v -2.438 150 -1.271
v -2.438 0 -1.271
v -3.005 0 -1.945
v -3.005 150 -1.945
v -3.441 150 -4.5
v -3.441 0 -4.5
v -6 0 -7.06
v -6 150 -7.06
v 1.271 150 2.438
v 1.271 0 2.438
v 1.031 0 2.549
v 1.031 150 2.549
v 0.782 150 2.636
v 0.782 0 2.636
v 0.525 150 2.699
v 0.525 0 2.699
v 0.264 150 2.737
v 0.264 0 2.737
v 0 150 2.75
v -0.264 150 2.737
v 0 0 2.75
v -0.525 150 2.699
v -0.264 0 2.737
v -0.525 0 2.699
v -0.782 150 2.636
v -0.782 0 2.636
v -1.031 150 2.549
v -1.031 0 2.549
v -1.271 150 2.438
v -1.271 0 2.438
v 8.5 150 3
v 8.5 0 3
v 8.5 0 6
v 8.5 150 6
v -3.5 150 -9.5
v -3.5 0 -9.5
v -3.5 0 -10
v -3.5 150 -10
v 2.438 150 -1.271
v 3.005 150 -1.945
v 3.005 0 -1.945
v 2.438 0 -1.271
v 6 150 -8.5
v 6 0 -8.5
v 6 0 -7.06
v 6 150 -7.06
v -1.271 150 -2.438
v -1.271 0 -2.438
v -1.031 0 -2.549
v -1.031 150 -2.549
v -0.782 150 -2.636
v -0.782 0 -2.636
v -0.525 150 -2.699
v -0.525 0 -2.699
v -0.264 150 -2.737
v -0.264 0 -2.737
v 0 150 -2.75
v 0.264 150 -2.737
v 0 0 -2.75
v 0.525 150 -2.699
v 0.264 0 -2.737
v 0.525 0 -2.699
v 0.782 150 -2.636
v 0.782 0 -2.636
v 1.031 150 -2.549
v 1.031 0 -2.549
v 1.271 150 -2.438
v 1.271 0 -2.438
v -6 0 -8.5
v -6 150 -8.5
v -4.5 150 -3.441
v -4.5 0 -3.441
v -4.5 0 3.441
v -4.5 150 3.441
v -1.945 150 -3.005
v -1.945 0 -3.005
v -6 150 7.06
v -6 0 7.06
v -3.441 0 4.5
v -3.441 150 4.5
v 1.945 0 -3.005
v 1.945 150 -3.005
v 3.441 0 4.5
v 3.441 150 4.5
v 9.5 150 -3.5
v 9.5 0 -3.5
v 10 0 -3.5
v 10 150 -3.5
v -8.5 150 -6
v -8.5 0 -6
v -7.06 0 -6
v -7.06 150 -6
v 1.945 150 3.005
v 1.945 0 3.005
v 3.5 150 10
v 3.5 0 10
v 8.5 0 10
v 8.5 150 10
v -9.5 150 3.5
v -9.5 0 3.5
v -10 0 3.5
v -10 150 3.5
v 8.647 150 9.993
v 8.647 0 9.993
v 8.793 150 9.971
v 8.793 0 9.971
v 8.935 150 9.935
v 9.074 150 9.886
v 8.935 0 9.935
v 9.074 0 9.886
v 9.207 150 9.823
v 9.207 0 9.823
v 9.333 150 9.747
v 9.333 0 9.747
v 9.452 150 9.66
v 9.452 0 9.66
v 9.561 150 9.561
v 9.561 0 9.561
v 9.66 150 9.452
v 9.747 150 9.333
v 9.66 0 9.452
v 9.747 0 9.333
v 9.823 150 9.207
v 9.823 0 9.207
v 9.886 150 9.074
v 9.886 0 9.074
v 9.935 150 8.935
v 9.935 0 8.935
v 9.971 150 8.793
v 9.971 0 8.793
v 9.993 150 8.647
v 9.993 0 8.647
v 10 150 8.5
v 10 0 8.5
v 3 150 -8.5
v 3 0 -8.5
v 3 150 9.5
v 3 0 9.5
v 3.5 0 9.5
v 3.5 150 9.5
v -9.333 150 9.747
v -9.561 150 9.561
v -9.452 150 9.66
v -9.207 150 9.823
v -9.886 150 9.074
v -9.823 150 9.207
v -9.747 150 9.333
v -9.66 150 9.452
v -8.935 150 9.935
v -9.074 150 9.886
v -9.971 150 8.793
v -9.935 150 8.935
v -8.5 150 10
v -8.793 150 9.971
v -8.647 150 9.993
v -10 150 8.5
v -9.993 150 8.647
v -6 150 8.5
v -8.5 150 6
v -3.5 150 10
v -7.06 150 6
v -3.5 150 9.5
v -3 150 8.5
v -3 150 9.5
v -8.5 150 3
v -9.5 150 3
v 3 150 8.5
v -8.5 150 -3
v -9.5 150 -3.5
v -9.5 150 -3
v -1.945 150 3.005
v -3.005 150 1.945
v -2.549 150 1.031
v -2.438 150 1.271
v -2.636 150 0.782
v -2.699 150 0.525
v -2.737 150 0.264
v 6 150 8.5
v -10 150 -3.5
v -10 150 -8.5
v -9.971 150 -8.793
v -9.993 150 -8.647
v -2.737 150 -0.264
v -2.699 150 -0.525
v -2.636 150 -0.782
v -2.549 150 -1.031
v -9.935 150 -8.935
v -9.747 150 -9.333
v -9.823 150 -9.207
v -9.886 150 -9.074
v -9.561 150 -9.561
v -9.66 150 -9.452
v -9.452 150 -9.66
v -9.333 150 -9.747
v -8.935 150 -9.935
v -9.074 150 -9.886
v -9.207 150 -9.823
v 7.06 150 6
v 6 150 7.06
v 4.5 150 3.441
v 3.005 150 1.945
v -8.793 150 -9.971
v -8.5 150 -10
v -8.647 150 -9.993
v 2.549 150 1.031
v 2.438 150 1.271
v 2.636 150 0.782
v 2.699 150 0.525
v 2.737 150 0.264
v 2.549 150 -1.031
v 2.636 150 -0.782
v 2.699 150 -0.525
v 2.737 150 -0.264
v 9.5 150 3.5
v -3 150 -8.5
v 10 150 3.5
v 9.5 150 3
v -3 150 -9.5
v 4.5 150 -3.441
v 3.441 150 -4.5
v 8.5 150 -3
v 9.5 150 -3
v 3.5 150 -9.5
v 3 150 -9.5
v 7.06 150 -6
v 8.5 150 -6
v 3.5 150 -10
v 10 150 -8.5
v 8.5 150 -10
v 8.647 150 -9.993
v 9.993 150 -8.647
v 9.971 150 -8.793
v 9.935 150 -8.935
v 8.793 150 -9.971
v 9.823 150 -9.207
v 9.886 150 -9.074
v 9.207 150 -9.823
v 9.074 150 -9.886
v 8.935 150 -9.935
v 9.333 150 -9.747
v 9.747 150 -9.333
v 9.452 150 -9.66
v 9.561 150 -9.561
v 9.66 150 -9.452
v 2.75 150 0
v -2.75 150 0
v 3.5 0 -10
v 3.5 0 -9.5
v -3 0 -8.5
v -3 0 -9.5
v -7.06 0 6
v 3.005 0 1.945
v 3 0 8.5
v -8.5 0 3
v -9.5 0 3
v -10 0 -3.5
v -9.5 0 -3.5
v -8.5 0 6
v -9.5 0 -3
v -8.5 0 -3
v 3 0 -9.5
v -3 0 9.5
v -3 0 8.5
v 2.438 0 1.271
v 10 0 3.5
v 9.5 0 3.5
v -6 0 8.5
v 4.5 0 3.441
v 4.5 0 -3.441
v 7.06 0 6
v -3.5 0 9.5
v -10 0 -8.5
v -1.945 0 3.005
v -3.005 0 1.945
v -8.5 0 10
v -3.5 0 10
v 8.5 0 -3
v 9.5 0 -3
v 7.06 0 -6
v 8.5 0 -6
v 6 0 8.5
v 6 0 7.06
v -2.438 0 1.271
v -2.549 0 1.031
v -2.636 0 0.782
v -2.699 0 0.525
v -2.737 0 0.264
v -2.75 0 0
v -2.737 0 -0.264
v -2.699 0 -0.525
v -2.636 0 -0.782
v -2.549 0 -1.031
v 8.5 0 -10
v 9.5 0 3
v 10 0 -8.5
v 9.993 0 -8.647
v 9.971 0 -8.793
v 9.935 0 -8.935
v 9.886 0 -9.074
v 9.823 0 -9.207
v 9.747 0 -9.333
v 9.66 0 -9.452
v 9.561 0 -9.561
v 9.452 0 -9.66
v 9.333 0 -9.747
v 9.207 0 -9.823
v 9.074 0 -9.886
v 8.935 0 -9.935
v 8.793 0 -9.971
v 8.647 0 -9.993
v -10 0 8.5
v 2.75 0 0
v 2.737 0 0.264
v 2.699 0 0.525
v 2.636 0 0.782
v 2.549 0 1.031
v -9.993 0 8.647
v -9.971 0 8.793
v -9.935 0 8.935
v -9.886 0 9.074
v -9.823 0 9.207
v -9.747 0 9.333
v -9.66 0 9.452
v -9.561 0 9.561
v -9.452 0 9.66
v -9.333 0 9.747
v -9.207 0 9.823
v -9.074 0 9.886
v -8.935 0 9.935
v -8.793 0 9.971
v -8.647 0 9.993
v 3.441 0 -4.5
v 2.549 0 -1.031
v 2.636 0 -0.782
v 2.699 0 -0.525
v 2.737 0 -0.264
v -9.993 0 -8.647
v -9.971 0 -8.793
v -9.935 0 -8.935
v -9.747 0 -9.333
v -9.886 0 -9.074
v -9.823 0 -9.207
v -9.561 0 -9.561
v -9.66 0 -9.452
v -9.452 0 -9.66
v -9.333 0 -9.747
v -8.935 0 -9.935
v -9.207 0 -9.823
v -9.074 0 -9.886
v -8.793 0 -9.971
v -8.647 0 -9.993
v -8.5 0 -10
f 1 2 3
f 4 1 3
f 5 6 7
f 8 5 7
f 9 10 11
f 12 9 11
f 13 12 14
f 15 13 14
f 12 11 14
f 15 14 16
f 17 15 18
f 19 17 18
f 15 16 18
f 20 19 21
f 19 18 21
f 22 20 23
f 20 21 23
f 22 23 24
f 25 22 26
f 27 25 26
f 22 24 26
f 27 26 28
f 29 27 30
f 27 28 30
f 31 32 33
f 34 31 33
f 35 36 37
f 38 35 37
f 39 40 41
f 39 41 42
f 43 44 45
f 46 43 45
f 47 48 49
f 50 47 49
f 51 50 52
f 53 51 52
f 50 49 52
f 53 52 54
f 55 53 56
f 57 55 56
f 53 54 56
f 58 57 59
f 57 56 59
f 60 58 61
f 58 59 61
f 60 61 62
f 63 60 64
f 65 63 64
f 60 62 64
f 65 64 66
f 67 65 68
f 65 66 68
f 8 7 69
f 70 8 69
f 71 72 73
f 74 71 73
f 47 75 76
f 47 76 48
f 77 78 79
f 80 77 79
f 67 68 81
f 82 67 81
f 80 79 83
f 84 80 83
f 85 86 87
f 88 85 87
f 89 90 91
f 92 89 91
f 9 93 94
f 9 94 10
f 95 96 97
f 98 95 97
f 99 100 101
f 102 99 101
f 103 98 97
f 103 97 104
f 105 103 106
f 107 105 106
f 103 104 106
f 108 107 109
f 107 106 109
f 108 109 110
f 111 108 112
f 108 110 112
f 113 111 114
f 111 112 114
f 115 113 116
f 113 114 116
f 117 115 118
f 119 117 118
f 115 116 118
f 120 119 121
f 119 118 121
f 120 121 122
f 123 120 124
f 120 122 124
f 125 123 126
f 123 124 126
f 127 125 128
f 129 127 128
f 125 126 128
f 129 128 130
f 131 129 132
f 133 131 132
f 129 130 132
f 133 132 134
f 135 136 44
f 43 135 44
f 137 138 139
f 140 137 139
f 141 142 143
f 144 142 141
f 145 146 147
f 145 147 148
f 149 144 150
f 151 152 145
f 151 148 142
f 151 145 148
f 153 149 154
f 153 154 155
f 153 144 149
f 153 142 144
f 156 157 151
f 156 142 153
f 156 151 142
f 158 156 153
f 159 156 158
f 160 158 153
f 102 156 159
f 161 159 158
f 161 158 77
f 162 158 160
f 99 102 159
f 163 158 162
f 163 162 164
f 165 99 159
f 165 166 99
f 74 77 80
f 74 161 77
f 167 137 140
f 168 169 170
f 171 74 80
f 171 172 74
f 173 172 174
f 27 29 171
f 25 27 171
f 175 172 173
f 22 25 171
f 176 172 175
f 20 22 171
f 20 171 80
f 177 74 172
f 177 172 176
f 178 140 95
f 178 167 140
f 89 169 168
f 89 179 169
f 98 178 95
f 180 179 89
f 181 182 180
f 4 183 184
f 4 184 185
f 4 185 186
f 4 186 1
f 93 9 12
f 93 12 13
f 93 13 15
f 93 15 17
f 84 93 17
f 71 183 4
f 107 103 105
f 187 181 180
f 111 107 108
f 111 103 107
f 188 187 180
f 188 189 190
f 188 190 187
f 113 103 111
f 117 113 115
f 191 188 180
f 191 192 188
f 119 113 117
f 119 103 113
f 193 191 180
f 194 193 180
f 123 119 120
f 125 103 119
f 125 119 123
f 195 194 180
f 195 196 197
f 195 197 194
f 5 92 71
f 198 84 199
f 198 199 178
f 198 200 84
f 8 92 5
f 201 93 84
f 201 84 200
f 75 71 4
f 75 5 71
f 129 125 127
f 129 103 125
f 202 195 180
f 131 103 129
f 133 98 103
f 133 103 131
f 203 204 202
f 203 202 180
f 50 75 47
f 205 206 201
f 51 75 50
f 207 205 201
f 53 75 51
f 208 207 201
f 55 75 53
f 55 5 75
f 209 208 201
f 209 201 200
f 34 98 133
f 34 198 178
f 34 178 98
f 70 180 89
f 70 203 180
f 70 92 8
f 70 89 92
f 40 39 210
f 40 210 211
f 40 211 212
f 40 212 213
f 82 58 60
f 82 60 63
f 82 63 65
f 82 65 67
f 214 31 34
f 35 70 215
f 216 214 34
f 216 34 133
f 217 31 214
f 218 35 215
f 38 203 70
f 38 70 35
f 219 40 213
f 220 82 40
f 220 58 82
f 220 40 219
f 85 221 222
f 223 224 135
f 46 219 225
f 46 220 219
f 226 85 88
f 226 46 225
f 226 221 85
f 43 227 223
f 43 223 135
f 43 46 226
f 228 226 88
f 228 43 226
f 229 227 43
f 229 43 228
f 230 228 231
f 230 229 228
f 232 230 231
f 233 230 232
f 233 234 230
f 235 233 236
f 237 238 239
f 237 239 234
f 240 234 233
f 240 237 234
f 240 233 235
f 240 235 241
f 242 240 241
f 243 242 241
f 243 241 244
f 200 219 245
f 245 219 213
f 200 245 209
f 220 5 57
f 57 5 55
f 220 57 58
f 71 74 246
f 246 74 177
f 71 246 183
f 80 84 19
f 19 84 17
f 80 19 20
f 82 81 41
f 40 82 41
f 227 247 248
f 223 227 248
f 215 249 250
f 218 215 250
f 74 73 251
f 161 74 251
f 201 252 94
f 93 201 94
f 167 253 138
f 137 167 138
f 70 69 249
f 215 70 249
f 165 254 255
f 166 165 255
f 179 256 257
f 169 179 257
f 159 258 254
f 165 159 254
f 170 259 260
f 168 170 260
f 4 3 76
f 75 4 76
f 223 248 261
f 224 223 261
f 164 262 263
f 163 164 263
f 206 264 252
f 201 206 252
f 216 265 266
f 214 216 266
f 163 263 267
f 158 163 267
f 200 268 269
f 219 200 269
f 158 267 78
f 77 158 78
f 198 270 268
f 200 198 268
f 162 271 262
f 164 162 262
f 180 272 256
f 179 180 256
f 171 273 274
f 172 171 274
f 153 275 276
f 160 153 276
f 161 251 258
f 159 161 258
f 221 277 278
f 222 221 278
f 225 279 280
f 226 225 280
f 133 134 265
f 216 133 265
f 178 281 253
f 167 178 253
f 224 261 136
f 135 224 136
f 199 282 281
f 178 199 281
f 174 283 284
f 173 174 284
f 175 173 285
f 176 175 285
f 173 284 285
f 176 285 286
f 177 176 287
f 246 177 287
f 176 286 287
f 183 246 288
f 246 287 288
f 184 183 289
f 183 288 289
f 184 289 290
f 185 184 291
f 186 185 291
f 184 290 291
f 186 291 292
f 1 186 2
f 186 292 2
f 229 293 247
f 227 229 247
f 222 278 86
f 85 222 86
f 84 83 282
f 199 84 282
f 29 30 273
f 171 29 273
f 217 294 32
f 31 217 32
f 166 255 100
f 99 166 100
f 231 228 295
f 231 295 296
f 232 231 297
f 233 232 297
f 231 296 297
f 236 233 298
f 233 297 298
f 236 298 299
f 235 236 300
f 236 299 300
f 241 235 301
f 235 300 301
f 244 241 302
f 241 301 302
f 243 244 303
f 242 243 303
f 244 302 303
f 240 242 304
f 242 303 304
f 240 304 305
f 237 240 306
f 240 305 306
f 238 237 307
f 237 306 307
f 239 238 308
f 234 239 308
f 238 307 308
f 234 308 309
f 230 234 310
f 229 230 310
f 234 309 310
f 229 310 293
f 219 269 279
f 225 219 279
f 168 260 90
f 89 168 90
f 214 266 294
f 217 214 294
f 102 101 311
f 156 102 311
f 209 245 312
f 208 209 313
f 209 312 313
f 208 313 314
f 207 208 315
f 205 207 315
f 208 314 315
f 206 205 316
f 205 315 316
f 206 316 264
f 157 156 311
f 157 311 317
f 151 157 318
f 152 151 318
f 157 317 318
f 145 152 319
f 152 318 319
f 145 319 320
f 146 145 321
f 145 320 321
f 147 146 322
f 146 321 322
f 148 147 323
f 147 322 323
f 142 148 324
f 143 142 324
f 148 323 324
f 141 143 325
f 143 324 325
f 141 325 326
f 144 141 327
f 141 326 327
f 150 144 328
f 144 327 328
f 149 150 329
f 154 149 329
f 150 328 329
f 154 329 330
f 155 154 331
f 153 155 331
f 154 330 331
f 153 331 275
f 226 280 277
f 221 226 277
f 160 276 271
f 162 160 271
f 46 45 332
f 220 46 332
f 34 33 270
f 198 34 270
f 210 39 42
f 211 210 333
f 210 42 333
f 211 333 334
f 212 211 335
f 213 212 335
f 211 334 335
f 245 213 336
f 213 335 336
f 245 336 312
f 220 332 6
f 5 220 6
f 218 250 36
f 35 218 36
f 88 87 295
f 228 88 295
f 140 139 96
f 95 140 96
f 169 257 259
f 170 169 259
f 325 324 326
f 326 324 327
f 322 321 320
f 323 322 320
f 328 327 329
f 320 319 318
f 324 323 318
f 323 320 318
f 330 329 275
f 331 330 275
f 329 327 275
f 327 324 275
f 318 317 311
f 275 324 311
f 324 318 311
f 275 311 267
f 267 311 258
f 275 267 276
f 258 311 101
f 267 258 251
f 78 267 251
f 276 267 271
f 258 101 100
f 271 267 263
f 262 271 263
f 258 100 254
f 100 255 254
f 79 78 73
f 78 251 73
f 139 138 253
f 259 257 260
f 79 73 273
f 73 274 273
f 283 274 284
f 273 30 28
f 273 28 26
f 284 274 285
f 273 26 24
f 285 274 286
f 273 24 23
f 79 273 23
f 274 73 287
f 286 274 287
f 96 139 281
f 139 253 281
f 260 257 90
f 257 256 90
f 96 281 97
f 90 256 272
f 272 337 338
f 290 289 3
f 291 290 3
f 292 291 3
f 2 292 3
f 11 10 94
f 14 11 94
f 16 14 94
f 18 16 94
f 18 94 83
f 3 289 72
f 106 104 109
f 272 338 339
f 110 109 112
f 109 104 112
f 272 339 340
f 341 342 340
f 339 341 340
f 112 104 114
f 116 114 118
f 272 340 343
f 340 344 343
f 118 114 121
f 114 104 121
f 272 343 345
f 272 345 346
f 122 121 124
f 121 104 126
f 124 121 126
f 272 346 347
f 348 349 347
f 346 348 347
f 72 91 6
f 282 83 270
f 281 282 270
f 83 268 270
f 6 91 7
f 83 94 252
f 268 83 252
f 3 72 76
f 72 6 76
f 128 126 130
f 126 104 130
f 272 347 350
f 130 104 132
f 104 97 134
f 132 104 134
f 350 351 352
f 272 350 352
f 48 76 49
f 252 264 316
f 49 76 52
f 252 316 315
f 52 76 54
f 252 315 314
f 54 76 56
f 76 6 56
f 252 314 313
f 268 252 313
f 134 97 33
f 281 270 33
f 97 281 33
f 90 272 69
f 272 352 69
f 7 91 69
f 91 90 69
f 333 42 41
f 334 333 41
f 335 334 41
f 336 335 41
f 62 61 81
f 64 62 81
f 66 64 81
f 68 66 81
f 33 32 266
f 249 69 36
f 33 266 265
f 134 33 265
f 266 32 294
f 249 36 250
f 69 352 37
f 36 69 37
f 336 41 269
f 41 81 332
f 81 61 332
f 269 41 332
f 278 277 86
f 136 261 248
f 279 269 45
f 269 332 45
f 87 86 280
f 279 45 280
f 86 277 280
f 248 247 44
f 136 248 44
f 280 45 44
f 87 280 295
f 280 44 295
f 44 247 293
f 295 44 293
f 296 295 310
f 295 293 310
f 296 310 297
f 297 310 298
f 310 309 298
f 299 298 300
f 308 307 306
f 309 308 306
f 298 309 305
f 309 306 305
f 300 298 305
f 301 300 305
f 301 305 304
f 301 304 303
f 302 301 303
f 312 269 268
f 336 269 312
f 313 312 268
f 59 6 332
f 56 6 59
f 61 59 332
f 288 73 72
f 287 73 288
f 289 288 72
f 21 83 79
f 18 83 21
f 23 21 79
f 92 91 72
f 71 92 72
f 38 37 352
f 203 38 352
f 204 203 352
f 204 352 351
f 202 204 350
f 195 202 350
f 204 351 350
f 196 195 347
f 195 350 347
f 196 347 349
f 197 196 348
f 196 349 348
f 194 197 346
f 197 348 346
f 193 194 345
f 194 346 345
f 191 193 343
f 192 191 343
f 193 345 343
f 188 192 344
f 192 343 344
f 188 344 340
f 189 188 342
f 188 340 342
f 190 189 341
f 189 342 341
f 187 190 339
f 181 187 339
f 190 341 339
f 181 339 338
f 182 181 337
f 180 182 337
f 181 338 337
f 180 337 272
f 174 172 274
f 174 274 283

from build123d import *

# Parameters (mm, degrees)
DODANIE_WYCI_GNI_CIE1_DEPTH = 150


with BuildPart() as part:
    # Szkic1 → Dodanie-wyciągnięcie1 (new body)
    # profile 1 of 5: a face of its own
    with BuildSketch(Plane(origin=(0, 0, 0), x_dir=(1, 0, 0), z_dir=(0, 1, 0))):
        with BuildLine():
            Line((-7.06, 6), (-4.5, 3.440546933))
            Line((-4.5, 3.440546933), (-4.5, 4.5))
            Line((-4.5, 4.5), (-3.440546933, 4.5))
            Line((-3.440546933, 4.5), (-6, 7.06))
            Line((-6, 7.06), (-6, 8.5))
            Line((-6, 8.5), (-3, 8.5))
            Line((-3, 8.5), (-3, 9.5))
            Line((-3, 9.5), (-3.5, 9.5))
            Line((-3.5, 9.5), (-3.5, 10))
            Line((-3.5, 10), (-8.5, 10))
            ThreePointArc((-8.5, 10), (-9.560660172, 9.560660172), (-10, 8.5))
            Line((-10, 8.5), (-10, 3.5))
            Line((-10, 3.5), (-9.5, 3.5))
            Line((-9.5, 3.5), (-9.5, 3))
            Line((-9.5, 3), (-8.5, 3))
            Line((-8.5, 3), (-8.5, 6))
            Line((-8.5, 6), (-7.06, 6))
        make_face()
    # profile 2 of 5: a face of its own
    with BuildSketch(Plane(origin=(0, 0, 0), x_dir=(1, 0, 0), z_dir=(0, 1, 0))):
        with BuildLine():
            Line((4.5, 4.5), (4.5, 3.440546933))
            Line((4.5, 3.440546933), (7.06, 6))
            Line((7.06, 6), (8.5, 6))
            Line((8.5, 6), (8.5, 3))
            Line((8.5, 3), (9.5, 3))
            Line((9.5, 3), (9.5, 3.5))
            Line((9.5, 3.5), (10, 3.5))
            Line((10, 3.5), (10, 8.5))
            ThreePointArc((10, 8.5), (9.560660172, 9.560660172), (8.5, 10))
            Line((8.5, 10), (3.5, 10))
            Line((3.5, 10), (3.5, 9.5))
            Line((3.5, 9.5), (3, 9.5))
            Line((3, 9.5), (3, 8.5))
            Line((3, 8.5), (6, 8.5))
            Line((6, 8.5), (6, 7.06))
            Line((6, 7.06), (3.440546933, 4.5))
            Line((3.440546933, 4.5), (4.5, 4.5))
        make_face()
    # profile 3 of 5: a face of its own
    with BuildSketch(Plane(origin=(0, 0, 0), x_dir=(1, 0, 0), z_dir=(0, 1, 0))):
        Polygon((3.440546933, -4.5), (4.5, -4.5), (4.5, -3.440546933), (4.5, 3.440546933), (4.5, 4.5), (3.440546933, 4.5), (-3.440546933, 4.5), (-4.5, 4.5), (-4.5, 3.440546933), (-4.5, -3.440546933), (-4.5, -4.5), (-3.440546933, -4.5), align=None)
        with BuildLine():
            Line((-3.00520382, 1.944543648), (-1.944543648, 3.00520382))
            Line((-1.944543648, 3.00520382), (-1.271309214, 2.438498079))
            ThreePointArc((-1.271309214, 2.438498079), (0, 2.75), (1.271309214, 2.438498079))
            Line((1.271309214, 2.438498079), (1.944543648, 3.00520382))
            Line((1.944543648, 3.00520382), (3.00520382, 1.944543648))
            Line((3.00520382, 1.944543648), (2.438498079, 1.271309214))
            ThreePointArc((2.438498079, 1.271309214), (2.670989491, 0.654457899), (2.75, 0))
            ThreePointArc((2.75, 0), (2.670989491, -0.654457899), (2.438498079, -1.271309214))
            Line((2.438498079, -1.271309214), (3.00520382, -1.944543648))
            Line((3.00520382, -1.944543648), (1.944543648, -3.00520382))
            Line((1.944543648, -3.00520382), (1.271309214, -2.438498079))
            ThreePointArc((1.271309214, -2.438498079), (0, -2.75), (-1.271309214, -2.438498079))
            Line((-1.271309214, -2.438498079), (-1.944543648, -3.00520382))
            Line((-1.944543648, -3.00520382), (-3.00520382, -1.944543648))
            Line((-3.00520382, -1.944543648), (-2.438498079, -1.271309214))
            ThreePointArc((-2.438498079, -1.271309214), (-2.75, 0), (-2.438498079, 1.271309214))
            Line((-2.438498079, 1.271309214), (-3.00520382, 1.944543648))
        make_face(mode=Mode.SUBTRACT)
    # profile 4 of 5: a face of its own
    with BuildSketch(Plane(origin=(0, 0, 0), x_dir=(1, 0, 0), z_dir=(0, 1, 0))):
        with BuildLine():
            Line((-6, -7.06), (-3.440546933, -4.5))
            Line((-3.440546933, -4.5), (-4.5, -4.5))
            Line((-4.5, -4.5), (-4.5, -3.440546933))
            Line((-4.5, -3.440546933), (-7.06, -6))
            Line((-7.06, -6), (-8.5, -6))
            Line((-8.5, -6), (-8.5, -3))
            Line((-8.5, -3), (-9.5, -3))
            Line((-9.5, -3), (-9.5, -3.5))
            Line((-9.5, -3.5), (-10, -3.5))
            Line((-10, -3.5), (-10, -8.5))
            ThreePointArc((-10, -8.5), (-9.560660172, -9.560660172), (-8.5, -10))
            Line((-8.5, -10), (-3.5, -10))
            Line((-3.5, -10), (-3.5, -9.5))
            Line((-3.5, -9.5), (-3, -9.5))
            Line((-3, -9.5), (-3, -8.5))
            Line((-3, -8.5), (-6, -8.5))
            Line((-6, -8.5), (-6, -7.06))
        make_face()
    # profile 5 of 5: a face of its own
    with BuildSketch(Plane(origin=(0, 0, 0), x_dir=(1, 0, 0), z_dir=(0, 1, 0))):
        with BuildLine():
            Line((4.5, -3.440546933), (4.5, -4.5))
            Line((4.5, -4.5), (3.440546933, -4.5))
            Line((3.440546933, -4.5), (6, -7.06))
            Line((6, -7.06), (6, -8.5))
            Line((6, -8.5), (3, -8.5))
            Line((3, -8.5), (3, -9.5))
            Line((3, -9.5), (3.5, -9.5))
            Line((3.5, -9.5), (3.5, -10))
            Line((3.5, -10), (8.5, -10))
            ThreePointArc((8.5, -10), (9.560660172, -9.560660172), (10, -8.5))
            Line((10, -8.5), (10, -3.5))
            Line((10, -3.5), (9.5, -3.5))
            Line((9.5, -3.5), (9.5, -3))
            Line((9.5, -3), (8.5, -3))
            Line((8.5, -3), (8.5, -6))
            Line((8.5, -6), (7.06, -6))
            Line((7.06, -6), (4.5, -3.440546933))
        make_face()
    extrude(amount=DODANIE_WYCI_GNI_CIE1_DEPTH)


solid = part.part
